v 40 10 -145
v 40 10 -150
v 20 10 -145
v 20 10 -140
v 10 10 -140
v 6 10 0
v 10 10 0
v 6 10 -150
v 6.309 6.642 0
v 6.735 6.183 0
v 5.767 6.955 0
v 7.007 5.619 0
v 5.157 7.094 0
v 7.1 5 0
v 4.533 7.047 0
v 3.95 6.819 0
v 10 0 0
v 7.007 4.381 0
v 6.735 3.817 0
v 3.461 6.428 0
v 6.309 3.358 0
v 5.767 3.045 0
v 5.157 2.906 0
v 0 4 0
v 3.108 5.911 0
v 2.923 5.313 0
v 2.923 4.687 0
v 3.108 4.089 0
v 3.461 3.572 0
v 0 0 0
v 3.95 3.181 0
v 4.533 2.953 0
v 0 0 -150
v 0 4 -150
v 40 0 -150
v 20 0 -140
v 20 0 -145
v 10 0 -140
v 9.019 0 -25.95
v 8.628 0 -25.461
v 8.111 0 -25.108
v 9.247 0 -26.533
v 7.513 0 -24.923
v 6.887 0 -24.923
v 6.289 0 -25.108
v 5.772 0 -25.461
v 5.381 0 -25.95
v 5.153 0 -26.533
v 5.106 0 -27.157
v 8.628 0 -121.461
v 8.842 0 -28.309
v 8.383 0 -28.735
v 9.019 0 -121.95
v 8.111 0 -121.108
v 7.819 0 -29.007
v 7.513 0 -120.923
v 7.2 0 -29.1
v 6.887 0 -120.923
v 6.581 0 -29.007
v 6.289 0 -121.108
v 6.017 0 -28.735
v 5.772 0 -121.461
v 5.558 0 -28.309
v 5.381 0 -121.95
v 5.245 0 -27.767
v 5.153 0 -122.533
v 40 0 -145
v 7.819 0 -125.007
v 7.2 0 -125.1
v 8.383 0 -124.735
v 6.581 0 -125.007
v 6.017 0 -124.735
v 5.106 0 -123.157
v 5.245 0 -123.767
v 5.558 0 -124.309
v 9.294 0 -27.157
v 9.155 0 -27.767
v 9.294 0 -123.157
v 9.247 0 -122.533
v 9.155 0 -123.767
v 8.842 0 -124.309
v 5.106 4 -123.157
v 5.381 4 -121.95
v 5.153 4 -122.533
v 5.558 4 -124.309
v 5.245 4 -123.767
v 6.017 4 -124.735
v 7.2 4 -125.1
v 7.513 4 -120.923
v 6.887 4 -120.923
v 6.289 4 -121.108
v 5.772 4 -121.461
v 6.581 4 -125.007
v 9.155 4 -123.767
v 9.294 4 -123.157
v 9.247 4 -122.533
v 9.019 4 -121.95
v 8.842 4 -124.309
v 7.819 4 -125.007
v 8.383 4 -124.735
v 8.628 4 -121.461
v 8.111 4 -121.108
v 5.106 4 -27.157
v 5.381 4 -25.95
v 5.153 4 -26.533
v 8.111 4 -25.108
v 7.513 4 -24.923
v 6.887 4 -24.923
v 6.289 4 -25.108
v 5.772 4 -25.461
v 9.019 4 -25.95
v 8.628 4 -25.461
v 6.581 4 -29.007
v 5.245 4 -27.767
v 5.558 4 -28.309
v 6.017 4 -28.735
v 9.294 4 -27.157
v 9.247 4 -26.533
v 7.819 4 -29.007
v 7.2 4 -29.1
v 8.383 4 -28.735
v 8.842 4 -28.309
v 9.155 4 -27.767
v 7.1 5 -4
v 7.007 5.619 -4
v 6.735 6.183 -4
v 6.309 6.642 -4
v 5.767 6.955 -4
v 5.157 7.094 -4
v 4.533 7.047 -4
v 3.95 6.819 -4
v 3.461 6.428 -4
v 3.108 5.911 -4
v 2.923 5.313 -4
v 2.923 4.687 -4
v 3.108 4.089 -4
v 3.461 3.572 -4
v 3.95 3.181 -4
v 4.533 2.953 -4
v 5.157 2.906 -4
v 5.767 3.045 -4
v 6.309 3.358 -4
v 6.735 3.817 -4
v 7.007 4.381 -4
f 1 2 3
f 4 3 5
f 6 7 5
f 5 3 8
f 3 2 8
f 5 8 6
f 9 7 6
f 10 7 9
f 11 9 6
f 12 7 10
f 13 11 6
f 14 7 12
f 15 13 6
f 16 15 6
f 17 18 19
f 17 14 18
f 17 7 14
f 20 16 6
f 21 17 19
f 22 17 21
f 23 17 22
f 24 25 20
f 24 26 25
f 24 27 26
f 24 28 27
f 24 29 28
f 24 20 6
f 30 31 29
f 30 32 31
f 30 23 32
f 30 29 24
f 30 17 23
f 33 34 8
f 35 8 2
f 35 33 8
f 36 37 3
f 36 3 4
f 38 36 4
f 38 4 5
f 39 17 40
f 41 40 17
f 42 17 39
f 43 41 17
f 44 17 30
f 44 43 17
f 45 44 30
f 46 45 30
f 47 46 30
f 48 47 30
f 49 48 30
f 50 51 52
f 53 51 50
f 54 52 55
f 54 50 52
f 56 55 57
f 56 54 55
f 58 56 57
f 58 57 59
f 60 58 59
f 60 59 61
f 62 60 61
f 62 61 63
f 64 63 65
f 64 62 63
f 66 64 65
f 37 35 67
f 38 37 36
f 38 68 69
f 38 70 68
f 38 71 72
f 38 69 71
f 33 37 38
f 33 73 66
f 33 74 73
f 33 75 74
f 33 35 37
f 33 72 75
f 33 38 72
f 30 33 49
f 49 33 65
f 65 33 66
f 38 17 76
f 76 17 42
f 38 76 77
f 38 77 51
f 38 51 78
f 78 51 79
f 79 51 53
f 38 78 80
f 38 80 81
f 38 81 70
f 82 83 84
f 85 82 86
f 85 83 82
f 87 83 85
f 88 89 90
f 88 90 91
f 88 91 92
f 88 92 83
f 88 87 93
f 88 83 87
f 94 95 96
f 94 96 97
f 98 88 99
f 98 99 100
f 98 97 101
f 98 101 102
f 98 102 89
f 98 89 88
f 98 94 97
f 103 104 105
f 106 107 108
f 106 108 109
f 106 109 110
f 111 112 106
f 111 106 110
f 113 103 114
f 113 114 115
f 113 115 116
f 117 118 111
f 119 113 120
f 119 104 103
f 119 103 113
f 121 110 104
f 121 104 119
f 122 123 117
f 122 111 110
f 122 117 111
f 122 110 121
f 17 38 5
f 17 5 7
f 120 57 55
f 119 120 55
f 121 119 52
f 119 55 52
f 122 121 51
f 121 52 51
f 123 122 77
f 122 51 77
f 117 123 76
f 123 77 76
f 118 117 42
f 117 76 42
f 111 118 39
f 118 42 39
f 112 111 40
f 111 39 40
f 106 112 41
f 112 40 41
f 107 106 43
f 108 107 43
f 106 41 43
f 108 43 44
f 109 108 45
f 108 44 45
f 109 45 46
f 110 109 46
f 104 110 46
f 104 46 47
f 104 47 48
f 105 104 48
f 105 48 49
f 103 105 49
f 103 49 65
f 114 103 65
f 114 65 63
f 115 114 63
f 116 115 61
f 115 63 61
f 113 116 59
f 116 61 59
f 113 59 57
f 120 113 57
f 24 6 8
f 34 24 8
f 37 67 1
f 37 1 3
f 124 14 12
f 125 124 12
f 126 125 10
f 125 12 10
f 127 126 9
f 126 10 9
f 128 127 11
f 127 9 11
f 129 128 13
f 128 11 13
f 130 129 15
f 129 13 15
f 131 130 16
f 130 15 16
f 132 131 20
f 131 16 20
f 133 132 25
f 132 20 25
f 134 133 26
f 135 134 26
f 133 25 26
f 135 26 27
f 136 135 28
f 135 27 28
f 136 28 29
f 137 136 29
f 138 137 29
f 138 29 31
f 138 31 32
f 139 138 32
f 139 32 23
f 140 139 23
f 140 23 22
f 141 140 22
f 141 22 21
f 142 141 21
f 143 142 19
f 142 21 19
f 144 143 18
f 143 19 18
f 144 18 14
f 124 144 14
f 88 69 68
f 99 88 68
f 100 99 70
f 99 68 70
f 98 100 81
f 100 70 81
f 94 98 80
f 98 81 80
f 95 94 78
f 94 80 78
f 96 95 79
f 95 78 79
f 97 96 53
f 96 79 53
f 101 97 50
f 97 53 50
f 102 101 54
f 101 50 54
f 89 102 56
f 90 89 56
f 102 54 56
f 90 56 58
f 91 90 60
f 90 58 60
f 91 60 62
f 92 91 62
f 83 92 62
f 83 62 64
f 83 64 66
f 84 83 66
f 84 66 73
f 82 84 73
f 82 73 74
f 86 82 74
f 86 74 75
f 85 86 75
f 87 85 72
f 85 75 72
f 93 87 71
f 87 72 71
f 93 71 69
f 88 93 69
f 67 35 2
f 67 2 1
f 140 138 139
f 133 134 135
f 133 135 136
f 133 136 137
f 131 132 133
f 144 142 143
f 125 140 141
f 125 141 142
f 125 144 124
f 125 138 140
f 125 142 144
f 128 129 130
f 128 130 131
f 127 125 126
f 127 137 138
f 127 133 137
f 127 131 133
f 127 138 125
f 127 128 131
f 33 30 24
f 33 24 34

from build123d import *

# Parameters (mm, degrees)
DODANIE_WYCI_GNI_CIE1_DEPTH = 10
SZKIC2_R                    = 2.1
WYTNIJ_WYCI_GNI_CIE1_DEPTH  = 4
SZKIC3_R                    = 2.1
WYTNIJ_WYCI_GNI_CIE2_DEPTH  = 4
SFAZOWANIE1_SIZE            = 6


with BuildPart() as part:
    # Szkic1 → Dodanie-wyciągnięcie1 (new body)
    with BuildSketch(Plane(origin=(0, 0, 0), x_dir=(1, 0, 0), z_dir=(0, 1, 0))):
        Polygon((0, 0), (0, 150), (40, 150), (40, 145), (20, 145), (20, 140), (10, 140), (10, 0), align=None)
    extrude(amount=DODANIE_WYCI_GNI_CIE1_DEPTH)

    # Szkic2 → Wytnij-wyciągnięcie1 (cut)
    with BuildSketch(Plane.XZ):
        with Locations(Location((7.2, -27, 0), (0, 0, 270))):
            Circle(SZKIC2_R)
        with Locations(Location((7.2, -123, 0), (0, 0, 270))):
            Circle(SZKIC2_R)
    extrude(amount=-WYTNIJ_WYCI_GNI_CIE1_DEPTH, mode=Mode.SUBTRACT)

    # Szkic3 → Wytnij-wyciągnięcie2 (cut)
    with BuildSketch(Plane.XY):
        with Locations((5, 5)):
            Circle(SZKIC3_R)
    extrude(amount=-WYTNIJ_WYCI_GNI_CIE2_DEPTH, mode=Mode.SUBTRACT)

    # Sfazowanie1
    sfazowanie1_edges = [part.edges().sort_by_distance(p)[0] for p in [
        (0, 10, -75),
    ]]
    chamfer(sfazowanie1_edges, length=SFAZOWANIE1_SIZE)


solid = part.part
